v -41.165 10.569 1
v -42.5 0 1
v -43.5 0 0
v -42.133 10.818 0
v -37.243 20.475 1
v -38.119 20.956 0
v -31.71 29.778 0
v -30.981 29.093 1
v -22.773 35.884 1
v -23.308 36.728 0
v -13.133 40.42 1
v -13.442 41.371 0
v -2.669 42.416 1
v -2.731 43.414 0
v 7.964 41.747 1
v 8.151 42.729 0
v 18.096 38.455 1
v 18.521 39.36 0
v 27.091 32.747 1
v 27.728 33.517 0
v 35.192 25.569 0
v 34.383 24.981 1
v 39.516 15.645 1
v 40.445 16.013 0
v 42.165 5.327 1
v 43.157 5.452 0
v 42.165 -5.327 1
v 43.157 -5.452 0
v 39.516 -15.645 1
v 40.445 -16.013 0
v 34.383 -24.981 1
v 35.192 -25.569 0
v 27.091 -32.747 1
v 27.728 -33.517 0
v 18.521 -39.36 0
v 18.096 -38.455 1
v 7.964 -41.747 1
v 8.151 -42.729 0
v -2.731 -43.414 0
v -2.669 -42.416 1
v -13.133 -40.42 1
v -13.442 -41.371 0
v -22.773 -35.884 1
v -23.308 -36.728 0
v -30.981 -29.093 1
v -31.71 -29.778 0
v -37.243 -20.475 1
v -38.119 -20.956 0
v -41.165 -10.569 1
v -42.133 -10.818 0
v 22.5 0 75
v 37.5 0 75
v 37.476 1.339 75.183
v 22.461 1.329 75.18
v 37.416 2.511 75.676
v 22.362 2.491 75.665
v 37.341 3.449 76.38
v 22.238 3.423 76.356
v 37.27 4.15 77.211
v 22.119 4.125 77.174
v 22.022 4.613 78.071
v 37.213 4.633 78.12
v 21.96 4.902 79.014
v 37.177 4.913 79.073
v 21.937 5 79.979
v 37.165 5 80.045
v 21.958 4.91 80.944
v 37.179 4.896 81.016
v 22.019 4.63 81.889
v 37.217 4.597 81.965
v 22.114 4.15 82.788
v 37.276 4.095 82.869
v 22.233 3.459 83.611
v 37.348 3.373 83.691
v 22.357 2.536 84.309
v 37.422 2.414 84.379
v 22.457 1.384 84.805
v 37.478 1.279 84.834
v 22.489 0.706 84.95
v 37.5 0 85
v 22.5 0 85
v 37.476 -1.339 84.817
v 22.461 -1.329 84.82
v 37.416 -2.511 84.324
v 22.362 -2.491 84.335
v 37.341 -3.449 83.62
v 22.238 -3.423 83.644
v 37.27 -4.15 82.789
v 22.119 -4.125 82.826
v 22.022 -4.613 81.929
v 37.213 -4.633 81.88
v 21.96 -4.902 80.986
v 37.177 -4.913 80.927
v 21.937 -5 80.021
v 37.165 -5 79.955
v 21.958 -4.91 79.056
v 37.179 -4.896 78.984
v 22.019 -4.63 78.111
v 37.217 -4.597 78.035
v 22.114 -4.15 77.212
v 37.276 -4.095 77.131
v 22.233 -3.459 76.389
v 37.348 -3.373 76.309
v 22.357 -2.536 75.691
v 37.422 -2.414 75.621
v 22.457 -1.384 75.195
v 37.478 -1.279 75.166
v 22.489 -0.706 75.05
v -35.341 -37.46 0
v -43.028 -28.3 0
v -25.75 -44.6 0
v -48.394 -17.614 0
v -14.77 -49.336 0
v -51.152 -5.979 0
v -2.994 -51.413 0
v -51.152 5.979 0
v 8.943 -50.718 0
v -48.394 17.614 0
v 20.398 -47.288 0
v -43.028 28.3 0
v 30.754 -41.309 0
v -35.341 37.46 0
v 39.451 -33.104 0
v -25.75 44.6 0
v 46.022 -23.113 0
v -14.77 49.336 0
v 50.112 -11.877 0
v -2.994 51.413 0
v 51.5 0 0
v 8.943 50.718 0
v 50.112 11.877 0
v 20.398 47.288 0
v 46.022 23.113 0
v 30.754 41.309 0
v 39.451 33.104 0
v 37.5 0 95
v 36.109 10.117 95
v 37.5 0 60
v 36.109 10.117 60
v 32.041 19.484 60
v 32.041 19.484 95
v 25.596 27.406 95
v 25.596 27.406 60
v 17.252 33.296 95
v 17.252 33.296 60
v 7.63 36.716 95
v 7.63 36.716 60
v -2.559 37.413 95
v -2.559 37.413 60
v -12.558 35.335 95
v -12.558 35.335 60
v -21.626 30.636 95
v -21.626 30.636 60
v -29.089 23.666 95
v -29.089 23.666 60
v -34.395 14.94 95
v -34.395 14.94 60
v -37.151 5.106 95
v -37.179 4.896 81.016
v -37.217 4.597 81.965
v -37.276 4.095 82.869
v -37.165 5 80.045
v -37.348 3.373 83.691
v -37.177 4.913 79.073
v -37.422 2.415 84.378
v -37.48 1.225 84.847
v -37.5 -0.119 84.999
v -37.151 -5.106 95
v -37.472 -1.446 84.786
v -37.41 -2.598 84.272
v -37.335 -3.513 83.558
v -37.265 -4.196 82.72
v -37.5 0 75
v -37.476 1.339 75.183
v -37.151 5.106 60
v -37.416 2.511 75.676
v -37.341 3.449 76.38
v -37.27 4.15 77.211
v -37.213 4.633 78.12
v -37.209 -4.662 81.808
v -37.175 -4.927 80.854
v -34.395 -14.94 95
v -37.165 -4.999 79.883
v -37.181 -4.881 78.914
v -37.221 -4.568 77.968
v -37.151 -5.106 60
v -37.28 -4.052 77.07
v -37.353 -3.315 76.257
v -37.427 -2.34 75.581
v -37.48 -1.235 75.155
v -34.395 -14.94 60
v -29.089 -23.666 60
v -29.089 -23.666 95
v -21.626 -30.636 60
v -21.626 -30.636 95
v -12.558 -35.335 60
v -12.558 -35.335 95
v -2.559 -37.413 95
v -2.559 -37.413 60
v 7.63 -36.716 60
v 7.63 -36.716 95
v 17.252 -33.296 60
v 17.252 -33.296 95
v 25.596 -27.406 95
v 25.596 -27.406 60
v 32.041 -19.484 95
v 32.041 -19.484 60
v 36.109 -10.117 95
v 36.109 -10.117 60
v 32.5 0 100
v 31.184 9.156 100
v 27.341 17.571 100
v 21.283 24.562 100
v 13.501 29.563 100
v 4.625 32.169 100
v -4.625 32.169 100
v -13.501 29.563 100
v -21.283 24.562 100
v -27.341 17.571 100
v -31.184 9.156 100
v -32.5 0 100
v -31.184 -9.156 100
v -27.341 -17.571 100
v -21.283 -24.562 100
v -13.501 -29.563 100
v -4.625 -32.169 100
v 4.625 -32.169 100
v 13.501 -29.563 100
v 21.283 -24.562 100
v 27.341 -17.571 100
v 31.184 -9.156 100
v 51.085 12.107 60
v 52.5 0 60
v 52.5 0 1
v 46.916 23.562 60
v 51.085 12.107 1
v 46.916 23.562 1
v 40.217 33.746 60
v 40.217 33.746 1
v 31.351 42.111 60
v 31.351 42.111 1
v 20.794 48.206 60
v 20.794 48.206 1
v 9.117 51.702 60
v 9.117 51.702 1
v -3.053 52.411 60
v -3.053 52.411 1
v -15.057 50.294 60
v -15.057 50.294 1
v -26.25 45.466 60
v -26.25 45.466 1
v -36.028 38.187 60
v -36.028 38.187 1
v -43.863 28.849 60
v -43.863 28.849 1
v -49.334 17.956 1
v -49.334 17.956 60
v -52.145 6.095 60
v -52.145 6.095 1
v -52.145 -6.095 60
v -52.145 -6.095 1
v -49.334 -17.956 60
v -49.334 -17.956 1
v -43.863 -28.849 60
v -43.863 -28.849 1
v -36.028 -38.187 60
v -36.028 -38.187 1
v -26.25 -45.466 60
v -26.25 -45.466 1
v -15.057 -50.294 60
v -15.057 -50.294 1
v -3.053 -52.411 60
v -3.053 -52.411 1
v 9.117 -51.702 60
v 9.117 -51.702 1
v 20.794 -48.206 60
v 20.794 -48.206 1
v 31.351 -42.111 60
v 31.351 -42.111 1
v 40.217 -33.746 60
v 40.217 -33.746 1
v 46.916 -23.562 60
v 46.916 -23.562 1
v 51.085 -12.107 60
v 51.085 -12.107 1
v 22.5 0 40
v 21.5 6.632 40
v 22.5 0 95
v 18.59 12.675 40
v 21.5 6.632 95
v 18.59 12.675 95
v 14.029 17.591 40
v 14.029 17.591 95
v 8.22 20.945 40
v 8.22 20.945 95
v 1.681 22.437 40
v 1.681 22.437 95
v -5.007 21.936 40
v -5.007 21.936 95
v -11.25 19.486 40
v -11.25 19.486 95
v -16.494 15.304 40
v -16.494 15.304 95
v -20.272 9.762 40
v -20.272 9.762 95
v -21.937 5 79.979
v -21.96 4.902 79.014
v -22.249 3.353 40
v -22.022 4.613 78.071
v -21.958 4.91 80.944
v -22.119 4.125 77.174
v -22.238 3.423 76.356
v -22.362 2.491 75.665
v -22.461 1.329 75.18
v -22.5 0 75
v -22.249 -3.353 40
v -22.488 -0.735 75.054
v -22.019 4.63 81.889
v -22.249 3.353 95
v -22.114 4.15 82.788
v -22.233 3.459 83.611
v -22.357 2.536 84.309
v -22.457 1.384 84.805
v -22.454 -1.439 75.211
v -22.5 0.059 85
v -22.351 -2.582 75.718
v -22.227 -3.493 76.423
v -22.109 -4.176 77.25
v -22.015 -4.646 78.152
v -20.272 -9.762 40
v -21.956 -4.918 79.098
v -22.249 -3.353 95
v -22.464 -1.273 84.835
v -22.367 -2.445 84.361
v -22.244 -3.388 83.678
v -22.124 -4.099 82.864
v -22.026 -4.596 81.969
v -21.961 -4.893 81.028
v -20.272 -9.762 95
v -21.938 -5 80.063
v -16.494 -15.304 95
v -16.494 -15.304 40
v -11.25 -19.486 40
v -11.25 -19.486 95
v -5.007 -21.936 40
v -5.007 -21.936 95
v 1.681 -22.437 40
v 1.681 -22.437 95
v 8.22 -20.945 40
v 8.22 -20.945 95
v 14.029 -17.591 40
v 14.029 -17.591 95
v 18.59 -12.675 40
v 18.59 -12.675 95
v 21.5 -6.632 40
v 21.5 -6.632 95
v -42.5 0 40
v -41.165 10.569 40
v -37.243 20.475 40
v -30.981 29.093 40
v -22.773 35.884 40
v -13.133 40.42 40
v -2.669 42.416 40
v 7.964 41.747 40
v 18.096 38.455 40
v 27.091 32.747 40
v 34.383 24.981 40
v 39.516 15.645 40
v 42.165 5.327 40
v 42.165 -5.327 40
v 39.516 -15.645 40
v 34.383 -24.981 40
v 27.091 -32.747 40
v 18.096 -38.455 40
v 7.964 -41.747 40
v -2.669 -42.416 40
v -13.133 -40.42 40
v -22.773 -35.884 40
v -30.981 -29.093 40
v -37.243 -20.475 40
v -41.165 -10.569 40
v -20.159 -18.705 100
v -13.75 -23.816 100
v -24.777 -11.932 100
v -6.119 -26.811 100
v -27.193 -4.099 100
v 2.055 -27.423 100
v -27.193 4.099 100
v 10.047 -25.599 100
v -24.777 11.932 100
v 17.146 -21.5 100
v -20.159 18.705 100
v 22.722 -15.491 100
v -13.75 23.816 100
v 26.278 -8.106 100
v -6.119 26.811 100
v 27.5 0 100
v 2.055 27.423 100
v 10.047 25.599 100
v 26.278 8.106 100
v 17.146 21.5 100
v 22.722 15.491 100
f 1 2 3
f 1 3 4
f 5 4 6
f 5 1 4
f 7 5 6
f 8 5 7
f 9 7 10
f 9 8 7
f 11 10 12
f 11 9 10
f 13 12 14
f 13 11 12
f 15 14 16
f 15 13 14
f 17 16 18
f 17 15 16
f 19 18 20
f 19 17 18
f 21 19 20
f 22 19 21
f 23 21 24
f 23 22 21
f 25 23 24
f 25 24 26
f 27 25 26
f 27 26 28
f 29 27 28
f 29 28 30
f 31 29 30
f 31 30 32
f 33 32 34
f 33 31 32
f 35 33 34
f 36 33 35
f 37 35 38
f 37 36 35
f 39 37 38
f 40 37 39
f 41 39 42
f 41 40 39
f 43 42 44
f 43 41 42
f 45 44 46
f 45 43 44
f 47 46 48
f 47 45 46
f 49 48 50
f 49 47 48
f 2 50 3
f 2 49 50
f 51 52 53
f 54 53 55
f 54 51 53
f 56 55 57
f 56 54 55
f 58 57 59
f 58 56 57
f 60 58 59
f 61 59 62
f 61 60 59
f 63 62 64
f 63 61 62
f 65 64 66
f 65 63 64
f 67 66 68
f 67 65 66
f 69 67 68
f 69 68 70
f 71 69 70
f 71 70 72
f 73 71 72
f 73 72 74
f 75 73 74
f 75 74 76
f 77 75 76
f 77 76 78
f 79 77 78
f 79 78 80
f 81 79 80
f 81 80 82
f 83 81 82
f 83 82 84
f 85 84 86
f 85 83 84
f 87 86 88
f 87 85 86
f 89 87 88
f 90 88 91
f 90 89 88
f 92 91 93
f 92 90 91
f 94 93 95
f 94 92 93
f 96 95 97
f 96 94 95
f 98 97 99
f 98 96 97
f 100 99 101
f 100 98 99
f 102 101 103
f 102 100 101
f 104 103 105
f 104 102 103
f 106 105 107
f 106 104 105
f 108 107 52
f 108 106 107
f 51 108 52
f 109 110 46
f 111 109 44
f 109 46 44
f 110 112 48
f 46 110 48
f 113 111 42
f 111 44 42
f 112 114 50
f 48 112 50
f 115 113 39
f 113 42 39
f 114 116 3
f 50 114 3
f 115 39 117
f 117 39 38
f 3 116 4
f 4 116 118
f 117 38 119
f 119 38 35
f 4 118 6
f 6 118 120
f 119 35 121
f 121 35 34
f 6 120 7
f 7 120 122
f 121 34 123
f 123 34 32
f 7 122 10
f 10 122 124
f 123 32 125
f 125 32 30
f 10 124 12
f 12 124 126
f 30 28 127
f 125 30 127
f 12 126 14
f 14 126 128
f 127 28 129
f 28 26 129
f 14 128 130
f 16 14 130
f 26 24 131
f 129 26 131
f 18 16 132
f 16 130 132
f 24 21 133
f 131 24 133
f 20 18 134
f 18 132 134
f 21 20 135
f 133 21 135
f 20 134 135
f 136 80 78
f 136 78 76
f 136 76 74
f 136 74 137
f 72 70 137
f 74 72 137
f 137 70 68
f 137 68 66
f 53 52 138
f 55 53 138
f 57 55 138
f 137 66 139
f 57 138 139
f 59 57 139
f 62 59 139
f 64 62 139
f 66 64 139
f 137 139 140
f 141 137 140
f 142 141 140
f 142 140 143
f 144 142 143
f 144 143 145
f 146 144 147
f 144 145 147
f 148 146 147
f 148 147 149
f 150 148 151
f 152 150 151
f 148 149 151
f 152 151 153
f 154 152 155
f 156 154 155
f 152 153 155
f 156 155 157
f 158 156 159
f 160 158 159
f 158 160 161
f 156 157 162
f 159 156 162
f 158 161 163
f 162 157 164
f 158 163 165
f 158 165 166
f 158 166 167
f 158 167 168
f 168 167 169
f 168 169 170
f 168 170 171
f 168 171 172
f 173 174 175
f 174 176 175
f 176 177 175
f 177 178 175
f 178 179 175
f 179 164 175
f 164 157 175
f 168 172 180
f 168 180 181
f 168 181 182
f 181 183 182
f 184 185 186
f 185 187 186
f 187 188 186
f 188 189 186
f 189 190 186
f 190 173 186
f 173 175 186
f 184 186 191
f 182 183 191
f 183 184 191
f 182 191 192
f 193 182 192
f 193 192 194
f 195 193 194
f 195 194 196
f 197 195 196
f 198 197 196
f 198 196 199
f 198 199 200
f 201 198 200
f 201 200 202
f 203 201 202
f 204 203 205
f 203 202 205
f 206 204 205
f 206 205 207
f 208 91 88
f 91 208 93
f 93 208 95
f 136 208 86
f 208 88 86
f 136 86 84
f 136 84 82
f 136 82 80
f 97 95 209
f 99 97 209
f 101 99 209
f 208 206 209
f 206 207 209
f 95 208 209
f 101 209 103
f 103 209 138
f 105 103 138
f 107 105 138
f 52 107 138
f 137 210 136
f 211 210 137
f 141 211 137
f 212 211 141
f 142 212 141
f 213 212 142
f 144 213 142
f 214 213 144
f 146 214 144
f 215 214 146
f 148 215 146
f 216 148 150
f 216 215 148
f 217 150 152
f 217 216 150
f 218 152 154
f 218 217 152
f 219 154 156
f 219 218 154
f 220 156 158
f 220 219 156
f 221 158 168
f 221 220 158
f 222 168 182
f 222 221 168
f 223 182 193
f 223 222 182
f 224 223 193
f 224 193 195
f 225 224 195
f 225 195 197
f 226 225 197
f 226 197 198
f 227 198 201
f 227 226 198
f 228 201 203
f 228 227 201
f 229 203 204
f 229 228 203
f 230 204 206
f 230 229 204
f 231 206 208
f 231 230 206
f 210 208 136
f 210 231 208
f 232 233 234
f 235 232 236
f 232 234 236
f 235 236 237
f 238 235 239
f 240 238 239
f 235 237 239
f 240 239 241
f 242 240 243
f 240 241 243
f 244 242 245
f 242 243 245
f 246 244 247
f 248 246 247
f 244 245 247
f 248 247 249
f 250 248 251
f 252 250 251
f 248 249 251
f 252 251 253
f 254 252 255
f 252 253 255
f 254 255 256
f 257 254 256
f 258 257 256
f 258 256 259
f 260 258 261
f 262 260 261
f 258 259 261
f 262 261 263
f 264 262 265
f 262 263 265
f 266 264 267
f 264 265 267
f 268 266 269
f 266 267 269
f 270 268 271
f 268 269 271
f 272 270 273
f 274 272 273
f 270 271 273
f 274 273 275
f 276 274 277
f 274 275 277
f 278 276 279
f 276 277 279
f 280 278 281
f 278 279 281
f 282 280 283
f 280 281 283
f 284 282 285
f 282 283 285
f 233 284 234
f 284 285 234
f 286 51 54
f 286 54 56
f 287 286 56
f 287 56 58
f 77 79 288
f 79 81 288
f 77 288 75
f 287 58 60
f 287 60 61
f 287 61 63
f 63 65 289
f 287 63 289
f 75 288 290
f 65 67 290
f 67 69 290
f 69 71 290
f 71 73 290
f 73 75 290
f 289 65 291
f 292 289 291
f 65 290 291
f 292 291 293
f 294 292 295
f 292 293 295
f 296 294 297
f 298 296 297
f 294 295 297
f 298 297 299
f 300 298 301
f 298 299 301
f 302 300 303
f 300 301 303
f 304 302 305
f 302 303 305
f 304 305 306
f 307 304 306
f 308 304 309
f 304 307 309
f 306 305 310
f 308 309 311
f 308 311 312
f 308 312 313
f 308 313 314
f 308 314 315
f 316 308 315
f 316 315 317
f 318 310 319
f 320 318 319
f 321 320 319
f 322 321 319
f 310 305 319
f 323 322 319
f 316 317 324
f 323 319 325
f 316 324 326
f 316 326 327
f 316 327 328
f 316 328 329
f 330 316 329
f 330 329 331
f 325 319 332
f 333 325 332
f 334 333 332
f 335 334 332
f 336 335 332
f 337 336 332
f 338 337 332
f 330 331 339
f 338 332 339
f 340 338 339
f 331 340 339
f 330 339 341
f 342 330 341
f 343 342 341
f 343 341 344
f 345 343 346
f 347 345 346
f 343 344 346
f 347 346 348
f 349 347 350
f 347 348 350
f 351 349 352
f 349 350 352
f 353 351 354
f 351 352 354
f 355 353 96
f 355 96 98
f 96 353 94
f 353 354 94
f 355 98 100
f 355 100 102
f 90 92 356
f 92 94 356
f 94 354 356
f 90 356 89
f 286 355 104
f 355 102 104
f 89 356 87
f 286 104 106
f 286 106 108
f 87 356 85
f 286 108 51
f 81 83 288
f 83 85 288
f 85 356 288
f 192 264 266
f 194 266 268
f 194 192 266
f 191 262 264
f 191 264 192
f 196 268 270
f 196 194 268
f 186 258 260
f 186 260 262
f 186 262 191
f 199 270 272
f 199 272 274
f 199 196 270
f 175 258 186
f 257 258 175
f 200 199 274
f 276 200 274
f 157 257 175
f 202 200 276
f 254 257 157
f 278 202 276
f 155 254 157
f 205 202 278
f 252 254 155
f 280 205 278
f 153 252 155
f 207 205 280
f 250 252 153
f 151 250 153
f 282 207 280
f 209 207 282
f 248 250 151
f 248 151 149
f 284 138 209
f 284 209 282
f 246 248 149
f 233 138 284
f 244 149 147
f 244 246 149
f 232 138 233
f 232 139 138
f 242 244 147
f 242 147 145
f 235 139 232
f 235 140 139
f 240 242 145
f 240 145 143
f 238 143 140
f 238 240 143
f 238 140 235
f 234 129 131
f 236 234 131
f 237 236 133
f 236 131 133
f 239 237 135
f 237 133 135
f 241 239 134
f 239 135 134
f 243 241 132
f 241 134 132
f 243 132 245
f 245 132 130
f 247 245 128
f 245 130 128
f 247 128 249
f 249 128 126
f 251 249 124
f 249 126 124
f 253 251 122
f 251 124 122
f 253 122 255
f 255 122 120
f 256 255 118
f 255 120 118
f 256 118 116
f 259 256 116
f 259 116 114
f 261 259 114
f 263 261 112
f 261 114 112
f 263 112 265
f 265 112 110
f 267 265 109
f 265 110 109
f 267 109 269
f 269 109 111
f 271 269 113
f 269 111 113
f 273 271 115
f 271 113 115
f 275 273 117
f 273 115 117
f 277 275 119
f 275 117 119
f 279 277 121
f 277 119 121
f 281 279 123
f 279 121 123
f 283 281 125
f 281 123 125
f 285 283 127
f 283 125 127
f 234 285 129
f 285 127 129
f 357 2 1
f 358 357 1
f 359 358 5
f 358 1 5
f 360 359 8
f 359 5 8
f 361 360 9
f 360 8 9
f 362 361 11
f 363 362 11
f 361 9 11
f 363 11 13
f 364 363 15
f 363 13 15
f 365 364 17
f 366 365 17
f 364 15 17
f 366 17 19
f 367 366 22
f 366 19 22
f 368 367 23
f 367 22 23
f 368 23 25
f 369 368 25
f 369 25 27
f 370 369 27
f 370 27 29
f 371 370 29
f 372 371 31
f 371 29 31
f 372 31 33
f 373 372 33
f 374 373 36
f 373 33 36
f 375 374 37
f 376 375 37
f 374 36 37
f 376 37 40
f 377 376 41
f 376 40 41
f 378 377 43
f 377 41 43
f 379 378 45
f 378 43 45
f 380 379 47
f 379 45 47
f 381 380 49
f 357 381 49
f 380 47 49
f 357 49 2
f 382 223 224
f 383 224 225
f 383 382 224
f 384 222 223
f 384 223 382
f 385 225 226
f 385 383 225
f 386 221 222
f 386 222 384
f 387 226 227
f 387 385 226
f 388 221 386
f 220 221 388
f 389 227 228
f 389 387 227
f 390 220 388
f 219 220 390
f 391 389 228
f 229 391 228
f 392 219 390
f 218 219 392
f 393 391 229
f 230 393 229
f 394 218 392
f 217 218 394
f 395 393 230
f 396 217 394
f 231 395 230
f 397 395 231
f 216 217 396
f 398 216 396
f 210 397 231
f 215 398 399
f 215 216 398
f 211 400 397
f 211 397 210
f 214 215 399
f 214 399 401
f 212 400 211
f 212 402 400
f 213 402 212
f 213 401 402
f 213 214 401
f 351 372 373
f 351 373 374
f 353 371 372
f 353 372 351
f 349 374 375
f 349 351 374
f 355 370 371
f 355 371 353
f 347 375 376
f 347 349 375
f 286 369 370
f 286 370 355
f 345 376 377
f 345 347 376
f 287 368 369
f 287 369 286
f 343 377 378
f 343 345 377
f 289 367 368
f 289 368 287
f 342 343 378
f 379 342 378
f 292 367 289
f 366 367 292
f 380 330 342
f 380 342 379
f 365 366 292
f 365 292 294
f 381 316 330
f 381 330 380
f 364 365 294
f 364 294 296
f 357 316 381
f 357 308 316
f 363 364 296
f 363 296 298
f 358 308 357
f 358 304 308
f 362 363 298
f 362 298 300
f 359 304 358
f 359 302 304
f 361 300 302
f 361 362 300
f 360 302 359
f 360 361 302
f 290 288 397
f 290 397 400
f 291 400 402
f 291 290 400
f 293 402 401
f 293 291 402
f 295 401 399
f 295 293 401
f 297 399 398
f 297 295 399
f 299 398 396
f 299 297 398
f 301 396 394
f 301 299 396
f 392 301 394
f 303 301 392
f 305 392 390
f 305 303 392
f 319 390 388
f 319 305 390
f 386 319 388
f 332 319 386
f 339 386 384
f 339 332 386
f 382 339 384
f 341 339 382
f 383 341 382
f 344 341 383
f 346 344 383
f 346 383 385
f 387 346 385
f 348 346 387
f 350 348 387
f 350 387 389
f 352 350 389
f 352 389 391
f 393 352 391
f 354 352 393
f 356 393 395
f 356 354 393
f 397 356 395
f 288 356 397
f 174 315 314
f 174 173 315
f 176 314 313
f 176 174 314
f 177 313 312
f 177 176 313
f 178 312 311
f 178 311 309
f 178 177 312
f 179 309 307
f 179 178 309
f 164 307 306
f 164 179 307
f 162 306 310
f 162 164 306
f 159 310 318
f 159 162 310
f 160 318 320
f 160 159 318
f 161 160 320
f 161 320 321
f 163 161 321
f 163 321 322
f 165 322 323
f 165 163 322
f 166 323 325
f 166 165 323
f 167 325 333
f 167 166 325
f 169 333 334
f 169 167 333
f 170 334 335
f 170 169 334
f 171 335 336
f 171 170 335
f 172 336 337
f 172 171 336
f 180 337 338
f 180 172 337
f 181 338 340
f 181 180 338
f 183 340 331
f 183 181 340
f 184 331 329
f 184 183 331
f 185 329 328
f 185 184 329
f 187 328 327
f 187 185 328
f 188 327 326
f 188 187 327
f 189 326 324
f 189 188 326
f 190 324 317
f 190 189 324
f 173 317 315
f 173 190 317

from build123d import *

# Parameters (mm, degrees)
SKETCH_1_R               = 52.5
EXTRUDE_1_DEPTH          = 60
SKETCH_2_R               = 37.5
EXTRUDE_2_DEPTH          = 40
SKETCH_3_R               = 42.5
CUT_EXTRUDE_1_DEPTH      = 40
SKETCH_4_R               = 22.5
CUT_EXTRUDE_2_DEPTH      = 125.549187071
CHAMFER_1_SIZE           = 1
CUT_EXTRUDE_3_DEPTH      = 125.549187071
CUT_EXTRUDE_3_DEPTH_BACK = 125.549187071
SKETCH_5_R               = 5
CHAMFER_2_SIZE           = 5


with BuildPart() as part:
    # Эскиз1 → Бобышка-Вытянуть1 (new body)
    with BuildSketch(Plane.XY):
        Circle(SKETCH_1_R)
    extrude(amount=EXTRUDE_1_DEPTH)

    # Эскиз2 → Бобышка-Вытянуть2 (add)
    with BuildSketch(Plane.XY.offset(60)):
        Circle(SKETCH_2_R)
    extrude(amount=EXTRUDE_2_DEPTH)

    # Эскиз3 → Вырез-Вытянуть1 (cut)
    with BuildSketch(Plane(origin=(0, 0, 0), x_dir=(-1, 0, 0), z_dir=(0, 0, -1))):
        Circle(SKETCH_3_R)
    extrude(amount=-CUT_EXTRUDE_1_DEPTH, mode=Mode.SUBTRACT)

    # Эскиз4 → Вырез-Вытянуть2 (cut, through all)
    with BuildSketch(Plane.XY.offset(100)):
        Circle(SKETCH_4_R)
    extrude(amount=-CUT_EXTRUDE_2_DEPTH, mode=Mode.SUBTRACT)

    # Фаска1
    chamfer_1_edges = [part.edges().sort_by_distance(p)[0] for p in [
        (42.5, 0, 0),
        (-52.5, 0, 0),
    ]]
    chamfer(chamfer_1_edges, length=CHAMFER_1_SIZE)

    # Эскиз5 → Вырез-Вытянуть3 (cut, two sides: drawn at the far end of the back side and taken through both)
    with BuildSketch(Plane(origin=(0, 0, 0), x_dir=(0, 0, -1), z_dir=(1, 0, 0)).offset(-CUT_EXTRUDE_3_DEPTH_BACK)):
        with Locations((-80, 0)):
            Circle(SKETCH_5_R)
    extrude(amount=CUT_EXTRUDE_3_DEPTH + CUT_EXTRUDE_3_DEPTH_BACK, mode=Mode.SUBTRACT)

    # Фаска2
    chamfer_2_edges = [part.edges().sort_by_distance(p)[0] for p in [
        (-22.5, 0, 100),
        (-37.5, 0, 100),
    ]]
    chamfer(chamfer_2_edges, length=CHAMFER_2_SIZE)


solid = part.part
